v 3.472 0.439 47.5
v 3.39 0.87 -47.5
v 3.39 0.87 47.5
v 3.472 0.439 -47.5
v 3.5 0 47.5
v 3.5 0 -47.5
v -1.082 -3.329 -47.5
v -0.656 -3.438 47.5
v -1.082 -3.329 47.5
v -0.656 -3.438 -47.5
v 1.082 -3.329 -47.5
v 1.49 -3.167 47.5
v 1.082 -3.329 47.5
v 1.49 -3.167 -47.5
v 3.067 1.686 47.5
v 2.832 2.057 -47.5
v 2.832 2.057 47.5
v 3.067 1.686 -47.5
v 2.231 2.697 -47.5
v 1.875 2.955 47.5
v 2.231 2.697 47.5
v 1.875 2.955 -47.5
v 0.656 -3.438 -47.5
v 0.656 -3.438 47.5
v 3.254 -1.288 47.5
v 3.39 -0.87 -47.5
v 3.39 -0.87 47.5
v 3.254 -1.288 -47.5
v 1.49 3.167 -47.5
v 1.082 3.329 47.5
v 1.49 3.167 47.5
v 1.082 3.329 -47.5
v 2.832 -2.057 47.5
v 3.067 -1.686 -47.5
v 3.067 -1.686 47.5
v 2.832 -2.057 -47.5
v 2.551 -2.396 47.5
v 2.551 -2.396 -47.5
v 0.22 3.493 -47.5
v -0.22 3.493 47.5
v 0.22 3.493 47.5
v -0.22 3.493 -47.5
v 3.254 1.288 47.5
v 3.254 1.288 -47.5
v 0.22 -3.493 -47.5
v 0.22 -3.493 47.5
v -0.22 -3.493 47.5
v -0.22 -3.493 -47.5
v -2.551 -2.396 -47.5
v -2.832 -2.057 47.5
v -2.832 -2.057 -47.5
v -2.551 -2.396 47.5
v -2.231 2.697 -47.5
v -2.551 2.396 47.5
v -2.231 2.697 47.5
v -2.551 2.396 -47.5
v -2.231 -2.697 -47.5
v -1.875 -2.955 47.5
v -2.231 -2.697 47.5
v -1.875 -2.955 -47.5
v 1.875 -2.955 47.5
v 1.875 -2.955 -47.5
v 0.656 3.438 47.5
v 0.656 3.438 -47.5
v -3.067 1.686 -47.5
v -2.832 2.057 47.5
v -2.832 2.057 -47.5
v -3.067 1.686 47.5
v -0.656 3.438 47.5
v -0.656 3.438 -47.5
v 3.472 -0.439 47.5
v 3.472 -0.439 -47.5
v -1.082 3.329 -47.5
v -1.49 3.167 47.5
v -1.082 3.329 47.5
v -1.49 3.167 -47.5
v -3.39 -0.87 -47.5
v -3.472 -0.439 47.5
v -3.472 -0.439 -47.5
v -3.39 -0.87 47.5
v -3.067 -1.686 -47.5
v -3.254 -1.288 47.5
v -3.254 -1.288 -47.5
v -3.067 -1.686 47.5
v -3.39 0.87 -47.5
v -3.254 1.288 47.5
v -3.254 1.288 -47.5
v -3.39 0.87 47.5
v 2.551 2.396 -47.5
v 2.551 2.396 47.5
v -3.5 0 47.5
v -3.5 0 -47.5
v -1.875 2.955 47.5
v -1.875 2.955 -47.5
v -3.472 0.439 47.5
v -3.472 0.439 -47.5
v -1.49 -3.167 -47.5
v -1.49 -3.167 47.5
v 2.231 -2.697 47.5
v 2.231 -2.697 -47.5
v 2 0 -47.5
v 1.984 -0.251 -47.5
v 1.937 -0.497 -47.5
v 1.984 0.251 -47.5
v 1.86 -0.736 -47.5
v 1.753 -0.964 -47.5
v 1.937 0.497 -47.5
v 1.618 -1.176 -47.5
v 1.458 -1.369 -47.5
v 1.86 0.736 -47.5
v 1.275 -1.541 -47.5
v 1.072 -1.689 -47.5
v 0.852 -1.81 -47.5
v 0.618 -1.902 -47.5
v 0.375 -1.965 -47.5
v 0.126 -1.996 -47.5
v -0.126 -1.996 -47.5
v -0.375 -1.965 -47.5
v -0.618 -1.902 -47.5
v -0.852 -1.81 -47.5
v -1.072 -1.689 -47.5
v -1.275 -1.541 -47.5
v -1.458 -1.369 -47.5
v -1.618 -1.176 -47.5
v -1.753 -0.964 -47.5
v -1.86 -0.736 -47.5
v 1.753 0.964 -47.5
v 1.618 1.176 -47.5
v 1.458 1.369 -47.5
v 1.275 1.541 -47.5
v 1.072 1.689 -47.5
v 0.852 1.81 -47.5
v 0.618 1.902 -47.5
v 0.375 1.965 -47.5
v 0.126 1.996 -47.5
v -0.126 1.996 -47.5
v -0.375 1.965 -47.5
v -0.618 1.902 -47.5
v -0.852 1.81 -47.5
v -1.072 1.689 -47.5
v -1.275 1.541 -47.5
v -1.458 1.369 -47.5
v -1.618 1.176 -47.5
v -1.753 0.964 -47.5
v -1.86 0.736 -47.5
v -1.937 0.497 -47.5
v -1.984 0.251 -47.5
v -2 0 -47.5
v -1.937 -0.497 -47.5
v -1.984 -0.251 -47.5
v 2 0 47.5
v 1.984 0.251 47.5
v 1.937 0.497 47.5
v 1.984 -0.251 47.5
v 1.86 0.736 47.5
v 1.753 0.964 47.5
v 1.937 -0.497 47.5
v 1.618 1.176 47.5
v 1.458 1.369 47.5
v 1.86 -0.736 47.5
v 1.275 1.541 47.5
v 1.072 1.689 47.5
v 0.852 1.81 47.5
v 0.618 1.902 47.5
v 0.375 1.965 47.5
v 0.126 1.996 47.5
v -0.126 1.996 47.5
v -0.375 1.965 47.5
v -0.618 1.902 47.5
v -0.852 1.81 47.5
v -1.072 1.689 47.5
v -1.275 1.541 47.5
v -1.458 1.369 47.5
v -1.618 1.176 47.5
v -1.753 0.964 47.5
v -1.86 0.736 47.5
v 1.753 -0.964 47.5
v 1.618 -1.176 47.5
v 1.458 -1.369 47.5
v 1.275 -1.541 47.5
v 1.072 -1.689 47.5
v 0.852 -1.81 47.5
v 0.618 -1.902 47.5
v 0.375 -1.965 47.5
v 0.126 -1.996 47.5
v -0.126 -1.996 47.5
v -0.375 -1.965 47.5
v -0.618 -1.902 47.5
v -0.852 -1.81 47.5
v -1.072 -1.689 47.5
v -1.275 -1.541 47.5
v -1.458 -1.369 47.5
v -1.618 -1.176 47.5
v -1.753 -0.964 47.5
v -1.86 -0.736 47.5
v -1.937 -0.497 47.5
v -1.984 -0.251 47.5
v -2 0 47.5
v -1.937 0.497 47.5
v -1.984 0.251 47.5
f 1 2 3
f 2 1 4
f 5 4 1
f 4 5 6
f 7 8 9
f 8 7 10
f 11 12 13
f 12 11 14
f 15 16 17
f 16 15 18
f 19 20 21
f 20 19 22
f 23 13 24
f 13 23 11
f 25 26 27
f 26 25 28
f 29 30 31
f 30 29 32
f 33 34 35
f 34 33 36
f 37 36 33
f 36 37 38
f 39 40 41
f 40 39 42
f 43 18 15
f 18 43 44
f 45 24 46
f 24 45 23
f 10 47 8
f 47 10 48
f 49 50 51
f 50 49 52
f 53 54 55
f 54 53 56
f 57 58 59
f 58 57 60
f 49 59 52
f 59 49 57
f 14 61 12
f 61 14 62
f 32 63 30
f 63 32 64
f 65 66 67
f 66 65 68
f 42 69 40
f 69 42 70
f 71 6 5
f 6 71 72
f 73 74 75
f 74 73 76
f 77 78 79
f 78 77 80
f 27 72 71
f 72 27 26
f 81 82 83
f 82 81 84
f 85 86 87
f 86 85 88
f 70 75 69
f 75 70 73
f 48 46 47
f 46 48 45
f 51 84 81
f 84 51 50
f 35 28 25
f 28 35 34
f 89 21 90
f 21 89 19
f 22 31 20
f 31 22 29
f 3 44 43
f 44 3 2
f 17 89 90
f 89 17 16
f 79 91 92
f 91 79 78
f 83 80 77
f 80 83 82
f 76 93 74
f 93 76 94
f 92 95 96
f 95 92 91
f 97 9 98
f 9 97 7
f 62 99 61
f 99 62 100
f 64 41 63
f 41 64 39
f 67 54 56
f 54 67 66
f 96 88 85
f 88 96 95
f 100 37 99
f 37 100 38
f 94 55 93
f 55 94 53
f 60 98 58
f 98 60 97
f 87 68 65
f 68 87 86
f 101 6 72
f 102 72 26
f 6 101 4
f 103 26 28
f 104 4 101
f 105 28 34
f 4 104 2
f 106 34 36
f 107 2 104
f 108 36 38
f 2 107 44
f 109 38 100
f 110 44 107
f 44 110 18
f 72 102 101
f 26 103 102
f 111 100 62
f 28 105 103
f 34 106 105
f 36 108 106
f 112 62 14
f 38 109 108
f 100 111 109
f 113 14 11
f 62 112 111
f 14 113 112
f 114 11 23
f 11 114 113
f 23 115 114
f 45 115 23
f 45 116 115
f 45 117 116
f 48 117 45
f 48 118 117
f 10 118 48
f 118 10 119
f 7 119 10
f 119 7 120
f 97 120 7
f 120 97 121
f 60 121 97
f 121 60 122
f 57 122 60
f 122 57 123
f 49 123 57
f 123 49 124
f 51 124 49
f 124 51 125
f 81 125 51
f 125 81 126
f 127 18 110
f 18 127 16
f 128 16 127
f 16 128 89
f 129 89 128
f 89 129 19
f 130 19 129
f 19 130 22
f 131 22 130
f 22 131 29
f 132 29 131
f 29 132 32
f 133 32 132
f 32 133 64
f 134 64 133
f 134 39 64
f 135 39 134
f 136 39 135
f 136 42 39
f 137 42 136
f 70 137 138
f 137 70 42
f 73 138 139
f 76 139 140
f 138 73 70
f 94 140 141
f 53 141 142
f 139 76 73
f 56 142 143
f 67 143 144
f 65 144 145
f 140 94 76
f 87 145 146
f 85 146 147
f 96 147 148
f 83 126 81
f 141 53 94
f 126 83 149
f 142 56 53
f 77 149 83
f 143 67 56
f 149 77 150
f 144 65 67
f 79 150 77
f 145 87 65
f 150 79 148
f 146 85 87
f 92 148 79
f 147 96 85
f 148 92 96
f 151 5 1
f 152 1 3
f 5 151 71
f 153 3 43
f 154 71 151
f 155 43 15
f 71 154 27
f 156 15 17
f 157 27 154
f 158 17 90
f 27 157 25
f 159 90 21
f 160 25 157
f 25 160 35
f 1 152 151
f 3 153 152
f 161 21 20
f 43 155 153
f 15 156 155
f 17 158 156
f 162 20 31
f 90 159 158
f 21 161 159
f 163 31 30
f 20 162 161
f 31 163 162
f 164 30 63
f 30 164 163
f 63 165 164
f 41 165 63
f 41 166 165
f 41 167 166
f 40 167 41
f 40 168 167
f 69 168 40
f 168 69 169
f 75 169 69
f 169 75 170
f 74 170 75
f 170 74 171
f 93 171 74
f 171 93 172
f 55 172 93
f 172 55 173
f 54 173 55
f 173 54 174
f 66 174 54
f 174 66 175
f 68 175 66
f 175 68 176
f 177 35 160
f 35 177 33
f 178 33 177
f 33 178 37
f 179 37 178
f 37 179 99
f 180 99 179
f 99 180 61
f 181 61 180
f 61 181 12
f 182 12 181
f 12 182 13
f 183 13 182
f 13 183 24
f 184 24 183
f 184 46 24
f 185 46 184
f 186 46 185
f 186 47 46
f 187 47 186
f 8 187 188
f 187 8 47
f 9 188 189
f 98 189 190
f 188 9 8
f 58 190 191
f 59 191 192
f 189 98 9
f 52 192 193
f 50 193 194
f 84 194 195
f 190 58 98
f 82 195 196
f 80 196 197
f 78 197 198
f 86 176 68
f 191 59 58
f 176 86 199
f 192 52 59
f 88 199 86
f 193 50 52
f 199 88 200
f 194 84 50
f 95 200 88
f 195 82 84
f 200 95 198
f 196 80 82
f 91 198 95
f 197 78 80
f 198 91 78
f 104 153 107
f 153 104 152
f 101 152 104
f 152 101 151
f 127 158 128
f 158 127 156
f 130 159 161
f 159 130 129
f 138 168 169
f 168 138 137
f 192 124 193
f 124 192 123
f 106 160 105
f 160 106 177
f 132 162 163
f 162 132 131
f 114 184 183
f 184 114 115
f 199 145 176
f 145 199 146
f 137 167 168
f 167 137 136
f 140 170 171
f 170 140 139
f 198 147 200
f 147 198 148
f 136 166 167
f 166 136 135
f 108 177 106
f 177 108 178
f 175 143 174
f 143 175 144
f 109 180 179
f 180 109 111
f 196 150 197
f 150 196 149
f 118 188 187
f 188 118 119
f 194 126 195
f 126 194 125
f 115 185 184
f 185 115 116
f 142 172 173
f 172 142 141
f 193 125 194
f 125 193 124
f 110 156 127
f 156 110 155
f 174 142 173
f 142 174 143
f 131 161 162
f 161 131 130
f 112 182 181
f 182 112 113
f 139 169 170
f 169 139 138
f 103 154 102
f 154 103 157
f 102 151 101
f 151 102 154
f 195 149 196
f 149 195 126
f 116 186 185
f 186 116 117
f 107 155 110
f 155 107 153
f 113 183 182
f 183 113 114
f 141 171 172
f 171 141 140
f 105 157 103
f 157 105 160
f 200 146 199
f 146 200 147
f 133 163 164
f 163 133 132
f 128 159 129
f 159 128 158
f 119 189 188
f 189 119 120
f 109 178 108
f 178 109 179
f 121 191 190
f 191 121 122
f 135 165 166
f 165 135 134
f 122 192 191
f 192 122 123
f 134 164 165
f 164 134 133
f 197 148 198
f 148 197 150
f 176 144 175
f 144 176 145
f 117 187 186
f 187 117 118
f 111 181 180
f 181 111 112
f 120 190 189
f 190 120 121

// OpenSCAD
$fn = 50;


difference() {
	union() {
		translate(v = [0, 0, -47.5000000000]) {
			cylinder(h = 95, r = 3.5000000000);
		}
	}
	union() {
		translate(v = [0, 0, -100.0000000000]) {
			cylinder(h = 200, r = 2.0000000000);
		}
	}
}
